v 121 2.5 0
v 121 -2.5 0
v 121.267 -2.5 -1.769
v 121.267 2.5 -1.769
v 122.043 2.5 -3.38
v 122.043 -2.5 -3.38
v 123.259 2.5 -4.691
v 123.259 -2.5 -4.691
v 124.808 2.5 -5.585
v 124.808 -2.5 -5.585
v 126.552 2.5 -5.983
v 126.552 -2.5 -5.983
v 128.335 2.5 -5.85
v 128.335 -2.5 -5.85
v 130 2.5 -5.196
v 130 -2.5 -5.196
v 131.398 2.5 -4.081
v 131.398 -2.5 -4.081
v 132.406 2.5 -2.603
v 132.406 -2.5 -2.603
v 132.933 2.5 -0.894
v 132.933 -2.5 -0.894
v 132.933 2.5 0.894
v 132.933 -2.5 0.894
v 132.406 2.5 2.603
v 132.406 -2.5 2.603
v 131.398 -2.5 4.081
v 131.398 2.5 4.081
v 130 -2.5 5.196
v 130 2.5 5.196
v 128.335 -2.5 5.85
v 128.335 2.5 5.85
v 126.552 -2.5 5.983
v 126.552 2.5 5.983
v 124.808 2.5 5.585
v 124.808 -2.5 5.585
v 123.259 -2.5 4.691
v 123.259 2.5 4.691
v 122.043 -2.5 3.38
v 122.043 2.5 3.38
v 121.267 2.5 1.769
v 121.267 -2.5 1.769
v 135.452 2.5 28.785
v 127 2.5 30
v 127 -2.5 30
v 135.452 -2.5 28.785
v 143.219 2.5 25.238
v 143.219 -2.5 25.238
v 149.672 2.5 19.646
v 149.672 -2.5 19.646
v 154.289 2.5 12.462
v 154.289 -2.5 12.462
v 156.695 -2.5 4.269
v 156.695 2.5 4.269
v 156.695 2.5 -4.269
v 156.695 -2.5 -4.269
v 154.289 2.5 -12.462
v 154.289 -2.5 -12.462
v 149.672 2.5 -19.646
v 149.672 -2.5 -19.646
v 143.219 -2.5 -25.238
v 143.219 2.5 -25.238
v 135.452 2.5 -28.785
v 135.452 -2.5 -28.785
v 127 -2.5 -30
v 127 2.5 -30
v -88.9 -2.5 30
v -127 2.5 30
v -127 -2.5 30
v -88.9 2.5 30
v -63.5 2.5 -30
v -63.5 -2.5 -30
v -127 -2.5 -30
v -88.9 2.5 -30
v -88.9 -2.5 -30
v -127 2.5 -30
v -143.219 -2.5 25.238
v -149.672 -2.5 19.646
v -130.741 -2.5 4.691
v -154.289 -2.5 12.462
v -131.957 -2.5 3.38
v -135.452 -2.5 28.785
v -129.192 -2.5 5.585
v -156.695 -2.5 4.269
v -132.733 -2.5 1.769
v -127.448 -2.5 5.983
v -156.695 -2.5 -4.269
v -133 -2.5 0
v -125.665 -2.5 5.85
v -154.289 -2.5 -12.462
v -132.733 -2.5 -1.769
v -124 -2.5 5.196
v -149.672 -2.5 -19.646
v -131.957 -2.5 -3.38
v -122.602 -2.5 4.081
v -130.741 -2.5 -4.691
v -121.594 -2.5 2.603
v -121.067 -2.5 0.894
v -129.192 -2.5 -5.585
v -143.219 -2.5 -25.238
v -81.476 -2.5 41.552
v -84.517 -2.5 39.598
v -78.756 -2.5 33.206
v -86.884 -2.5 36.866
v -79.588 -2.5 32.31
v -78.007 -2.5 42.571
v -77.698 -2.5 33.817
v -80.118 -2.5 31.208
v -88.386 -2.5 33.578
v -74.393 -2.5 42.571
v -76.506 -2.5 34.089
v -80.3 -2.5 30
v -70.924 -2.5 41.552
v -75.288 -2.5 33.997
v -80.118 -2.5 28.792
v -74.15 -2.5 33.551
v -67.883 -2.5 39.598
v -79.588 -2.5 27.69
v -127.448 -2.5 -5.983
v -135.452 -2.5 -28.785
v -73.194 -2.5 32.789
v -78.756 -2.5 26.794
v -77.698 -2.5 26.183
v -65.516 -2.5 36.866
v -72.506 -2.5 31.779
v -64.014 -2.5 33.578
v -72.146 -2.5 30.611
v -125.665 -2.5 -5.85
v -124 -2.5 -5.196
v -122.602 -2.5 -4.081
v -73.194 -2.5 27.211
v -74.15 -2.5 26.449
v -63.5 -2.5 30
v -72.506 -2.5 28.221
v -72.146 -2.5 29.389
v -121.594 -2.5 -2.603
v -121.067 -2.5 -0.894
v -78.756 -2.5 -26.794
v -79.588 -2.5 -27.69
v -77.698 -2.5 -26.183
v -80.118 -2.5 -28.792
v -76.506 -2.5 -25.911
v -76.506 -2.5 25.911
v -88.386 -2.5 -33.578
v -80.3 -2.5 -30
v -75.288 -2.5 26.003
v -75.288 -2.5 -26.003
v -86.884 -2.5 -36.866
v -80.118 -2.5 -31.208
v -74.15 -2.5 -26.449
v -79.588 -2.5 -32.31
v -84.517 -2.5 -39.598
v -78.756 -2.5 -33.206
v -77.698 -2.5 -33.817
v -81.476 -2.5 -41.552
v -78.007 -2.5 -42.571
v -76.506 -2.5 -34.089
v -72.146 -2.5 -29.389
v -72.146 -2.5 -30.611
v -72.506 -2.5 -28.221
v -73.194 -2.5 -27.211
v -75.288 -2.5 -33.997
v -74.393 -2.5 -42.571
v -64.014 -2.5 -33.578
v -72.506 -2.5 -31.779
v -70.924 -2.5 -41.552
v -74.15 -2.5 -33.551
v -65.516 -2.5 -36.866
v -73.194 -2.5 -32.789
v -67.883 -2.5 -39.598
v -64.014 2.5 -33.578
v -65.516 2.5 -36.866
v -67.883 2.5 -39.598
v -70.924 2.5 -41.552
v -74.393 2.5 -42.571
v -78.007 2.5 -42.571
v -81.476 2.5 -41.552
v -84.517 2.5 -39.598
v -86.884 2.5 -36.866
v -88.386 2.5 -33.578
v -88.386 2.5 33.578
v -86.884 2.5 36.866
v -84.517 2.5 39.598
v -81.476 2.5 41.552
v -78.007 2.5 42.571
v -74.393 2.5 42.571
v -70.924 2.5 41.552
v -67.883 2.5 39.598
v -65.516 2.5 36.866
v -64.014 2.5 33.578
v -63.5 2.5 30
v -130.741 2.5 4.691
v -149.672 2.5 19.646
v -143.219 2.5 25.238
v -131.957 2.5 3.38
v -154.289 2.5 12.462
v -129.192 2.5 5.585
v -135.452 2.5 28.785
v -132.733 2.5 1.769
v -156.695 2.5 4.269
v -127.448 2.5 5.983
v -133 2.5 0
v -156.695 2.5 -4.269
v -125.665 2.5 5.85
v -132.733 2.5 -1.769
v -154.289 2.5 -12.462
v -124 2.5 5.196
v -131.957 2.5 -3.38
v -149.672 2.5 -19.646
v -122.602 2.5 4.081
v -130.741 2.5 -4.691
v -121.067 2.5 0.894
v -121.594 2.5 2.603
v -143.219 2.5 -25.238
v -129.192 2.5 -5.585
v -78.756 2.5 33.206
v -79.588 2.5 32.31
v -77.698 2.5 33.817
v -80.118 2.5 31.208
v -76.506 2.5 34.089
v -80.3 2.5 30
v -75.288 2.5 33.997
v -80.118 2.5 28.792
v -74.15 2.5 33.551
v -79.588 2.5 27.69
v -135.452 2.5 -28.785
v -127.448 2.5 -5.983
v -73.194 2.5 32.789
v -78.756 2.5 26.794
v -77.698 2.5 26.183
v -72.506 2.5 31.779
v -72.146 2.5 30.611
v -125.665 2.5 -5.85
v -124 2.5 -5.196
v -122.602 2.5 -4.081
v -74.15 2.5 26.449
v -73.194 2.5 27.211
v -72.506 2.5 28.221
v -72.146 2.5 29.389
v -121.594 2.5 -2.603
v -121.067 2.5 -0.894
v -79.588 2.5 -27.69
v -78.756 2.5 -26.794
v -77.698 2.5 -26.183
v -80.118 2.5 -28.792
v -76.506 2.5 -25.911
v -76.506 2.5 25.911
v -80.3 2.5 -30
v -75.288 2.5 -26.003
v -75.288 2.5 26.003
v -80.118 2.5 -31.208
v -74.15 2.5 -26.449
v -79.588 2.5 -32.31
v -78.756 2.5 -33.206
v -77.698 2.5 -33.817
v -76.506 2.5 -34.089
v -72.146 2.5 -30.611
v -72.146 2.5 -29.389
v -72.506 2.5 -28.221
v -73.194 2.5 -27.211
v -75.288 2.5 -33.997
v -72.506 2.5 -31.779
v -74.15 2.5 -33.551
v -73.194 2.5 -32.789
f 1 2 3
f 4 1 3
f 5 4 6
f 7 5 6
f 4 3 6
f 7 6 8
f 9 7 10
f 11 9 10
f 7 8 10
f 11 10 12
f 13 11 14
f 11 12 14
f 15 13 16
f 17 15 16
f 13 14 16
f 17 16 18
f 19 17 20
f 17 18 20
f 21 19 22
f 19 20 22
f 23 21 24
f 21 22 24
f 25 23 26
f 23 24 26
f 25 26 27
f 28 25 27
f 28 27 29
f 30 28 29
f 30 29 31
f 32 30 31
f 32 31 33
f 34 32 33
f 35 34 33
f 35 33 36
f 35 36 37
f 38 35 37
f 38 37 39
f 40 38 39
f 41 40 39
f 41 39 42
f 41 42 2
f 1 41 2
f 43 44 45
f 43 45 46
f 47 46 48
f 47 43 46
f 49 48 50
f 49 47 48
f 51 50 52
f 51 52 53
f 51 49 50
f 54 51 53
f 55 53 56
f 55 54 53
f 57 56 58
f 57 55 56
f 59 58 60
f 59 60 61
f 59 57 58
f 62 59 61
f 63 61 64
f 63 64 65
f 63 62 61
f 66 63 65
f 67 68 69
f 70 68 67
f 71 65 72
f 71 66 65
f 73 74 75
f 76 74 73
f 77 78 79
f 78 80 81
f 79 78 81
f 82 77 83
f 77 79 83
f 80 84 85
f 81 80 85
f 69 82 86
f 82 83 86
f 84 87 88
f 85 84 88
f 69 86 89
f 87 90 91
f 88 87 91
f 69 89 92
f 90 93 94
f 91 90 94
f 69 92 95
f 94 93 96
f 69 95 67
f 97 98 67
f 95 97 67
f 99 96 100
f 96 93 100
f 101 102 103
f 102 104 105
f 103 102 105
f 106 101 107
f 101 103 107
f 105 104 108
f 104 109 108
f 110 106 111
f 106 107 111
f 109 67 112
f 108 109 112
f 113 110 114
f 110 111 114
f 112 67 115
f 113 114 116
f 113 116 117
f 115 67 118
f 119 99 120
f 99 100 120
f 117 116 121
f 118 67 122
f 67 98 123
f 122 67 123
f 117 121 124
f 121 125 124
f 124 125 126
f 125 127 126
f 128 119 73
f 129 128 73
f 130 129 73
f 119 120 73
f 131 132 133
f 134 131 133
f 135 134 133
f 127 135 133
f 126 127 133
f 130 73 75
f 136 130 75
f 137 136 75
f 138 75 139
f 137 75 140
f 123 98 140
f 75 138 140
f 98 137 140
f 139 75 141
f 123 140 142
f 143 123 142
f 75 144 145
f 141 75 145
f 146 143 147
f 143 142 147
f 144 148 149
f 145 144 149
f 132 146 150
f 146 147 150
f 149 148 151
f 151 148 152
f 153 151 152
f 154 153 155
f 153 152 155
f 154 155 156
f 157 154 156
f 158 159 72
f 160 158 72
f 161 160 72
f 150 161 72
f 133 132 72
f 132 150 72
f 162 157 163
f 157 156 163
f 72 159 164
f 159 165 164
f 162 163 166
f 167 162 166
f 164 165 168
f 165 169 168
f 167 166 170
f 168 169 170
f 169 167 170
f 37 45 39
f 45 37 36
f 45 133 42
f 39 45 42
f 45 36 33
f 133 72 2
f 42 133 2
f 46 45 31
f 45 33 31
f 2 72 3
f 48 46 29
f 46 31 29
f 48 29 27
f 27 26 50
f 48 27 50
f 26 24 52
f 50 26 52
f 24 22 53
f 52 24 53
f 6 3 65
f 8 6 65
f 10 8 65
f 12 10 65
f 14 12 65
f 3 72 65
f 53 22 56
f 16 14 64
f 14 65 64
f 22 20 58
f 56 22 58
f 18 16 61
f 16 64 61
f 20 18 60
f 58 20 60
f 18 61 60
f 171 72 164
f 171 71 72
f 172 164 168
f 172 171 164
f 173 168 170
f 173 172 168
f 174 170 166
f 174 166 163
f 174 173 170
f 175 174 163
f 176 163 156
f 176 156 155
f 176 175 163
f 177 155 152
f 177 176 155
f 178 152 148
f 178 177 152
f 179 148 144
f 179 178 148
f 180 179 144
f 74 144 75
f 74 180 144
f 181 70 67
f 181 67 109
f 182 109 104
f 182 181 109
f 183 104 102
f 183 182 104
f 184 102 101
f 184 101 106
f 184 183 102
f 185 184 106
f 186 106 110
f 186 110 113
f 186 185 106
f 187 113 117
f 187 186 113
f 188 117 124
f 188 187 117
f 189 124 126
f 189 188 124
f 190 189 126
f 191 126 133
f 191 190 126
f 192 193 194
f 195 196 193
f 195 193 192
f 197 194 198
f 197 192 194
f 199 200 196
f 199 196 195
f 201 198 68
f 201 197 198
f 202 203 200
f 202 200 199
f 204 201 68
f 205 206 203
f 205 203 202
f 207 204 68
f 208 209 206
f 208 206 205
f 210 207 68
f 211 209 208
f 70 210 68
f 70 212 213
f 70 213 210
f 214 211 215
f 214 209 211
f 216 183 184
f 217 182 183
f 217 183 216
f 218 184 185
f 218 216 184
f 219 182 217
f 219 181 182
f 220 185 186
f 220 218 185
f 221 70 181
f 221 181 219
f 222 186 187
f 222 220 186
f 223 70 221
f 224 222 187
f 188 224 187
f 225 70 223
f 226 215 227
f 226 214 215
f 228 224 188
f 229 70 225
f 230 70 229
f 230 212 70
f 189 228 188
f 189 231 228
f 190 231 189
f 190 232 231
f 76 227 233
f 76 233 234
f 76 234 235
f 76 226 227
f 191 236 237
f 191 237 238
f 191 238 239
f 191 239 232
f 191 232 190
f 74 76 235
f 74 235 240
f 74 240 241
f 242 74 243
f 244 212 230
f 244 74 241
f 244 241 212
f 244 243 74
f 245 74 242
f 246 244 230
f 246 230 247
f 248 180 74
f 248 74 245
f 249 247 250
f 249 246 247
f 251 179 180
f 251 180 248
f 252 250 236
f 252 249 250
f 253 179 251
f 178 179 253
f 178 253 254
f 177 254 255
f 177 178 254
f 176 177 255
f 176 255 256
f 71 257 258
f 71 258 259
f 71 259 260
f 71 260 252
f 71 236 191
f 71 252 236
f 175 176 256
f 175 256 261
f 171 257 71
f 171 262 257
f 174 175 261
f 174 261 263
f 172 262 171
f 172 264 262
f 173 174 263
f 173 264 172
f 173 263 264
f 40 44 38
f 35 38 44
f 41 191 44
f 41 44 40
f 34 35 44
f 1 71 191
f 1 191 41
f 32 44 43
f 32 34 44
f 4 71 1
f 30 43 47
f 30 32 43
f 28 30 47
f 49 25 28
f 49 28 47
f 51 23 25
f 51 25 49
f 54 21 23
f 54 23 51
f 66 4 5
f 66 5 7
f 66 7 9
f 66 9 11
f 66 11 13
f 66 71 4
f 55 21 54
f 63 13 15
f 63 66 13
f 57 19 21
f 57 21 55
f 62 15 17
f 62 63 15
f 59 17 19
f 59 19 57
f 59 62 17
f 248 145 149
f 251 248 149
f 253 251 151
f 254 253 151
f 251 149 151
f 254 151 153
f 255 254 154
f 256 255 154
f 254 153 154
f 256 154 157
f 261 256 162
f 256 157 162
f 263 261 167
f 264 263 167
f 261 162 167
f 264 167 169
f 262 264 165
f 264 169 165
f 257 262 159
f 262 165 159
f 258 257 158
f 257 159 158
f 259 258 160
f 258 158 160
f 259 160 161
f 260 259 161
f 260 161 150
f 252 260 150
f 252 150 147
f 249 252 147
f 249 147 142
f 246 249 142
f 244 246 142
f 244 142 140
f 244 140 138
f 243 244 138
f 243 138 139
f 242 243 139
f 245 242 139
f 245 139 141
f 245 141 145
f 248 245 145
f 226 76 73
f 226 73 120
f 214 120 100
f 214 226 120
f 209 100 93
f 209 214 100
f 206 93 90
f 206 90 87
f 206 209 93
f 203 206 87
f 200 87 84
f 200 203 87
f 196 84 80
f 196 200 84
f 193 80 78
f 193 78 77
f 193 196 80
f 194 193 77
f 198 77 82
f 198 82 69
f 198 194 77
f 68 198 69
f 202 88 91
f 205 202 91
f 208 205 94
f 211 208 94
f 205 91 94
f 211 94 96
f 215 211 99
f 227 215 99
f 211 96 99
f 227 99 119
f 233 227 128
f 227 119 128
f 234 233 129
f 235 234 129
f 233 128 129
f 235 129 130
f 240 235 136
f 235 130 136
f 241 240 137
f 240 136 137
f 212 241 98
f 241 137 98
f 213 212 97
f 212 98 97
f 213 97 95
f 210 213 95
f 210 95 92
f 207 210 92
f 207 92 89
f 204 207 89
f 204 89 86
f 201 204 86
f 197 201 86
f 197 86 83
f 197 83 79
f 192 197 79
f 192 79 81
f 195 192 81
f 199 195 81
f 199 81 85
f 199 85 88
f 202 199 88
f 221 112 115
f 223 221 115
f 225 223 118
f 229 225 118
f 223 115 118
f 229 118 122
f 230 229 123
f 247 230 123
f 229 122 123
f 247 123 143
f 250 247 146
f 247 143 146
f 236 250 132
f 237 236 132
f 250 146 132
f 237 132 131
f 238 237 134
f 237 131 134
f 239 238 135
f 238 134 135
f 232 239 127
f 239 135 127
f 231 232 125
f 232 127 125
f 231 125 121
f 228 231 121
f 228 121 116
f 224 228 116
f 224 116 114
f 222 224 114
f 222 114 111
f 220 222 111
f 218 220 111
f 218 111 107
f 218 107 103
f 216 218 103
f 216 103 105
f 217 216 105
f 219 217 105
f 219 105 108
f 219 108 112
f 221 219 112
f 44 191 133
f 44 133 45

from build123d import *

# Parameters (mm, degrees)
BOSS_EXTRUDE1_DEPTH        = 2.5
F_12_0MM_DOWEL_HOLE1_D     = 12
F_12_0MM_DOWEL_HOLE1_DEPTH = 5
F_8_0MM_DOWEL_HOLE1_D      = 8.2
F_8_0MM_DOWEL_HOLE1_DEPTH  = 5


with BuildPart() as part:
    # Sketch1 → Boss-Extrude1 (new body, symmetric)
    with BuildSketch(Plane(origin=(0, 0, 0), x_dir=(1, 0, 0), z_dir=(0, 1, 0))):
        with BuildLine():
            Line((-88.9, 30), (-127, 30))
            ThreePointArc((-127, 30), (-157, 0), (-127, -30))
            Line((-127, -30), (-88.9, -30))
            ThreePointArc((-88.9, -30), (-76.2, -42.7), (-63.5, -30))
            Line((-63.5, -30), (127, -30))
            ThreePointArc((127, -30), (157, 0), (127, 30))
            Line((127, 30), (-63.5, 30))
            ThreePointArc((-63.5, 30), (-76.2, 42.7), (-88.9, 30))
        make_face()
    extrude(amount=BOSS_EXTRUDE1_DEPTH, both=True)

    # Ø12.0mm Dowel Hole1
    with Locations(Plane(origin=(0, 2.5, 0), x_dir=(1, 0, 0), z_dir=(0, 1, 0))):
        with Locations((-127, 0), (127, 0)):
            Hole(F_12_0MM_DOWEL_HOLE1_D / 2, depth=F_12_0MM_DOWEL_HOLE1_DEPTH)

    # Ø8.0mm Dowel Hole1
    with Locations(Plane(origin=(0, 2.5, 0), x_dir=(1, 0, 0), z_dir=(0, 1, 0))):
        with Locations((-76.2, 30), (-76.2, -30)):
            Hole(F_8_0MM_DOWEL_HOLE1_D / 2, depth=F_8_0MM_DOWEL_HOLE1_DEPTH)


solid = part.part
